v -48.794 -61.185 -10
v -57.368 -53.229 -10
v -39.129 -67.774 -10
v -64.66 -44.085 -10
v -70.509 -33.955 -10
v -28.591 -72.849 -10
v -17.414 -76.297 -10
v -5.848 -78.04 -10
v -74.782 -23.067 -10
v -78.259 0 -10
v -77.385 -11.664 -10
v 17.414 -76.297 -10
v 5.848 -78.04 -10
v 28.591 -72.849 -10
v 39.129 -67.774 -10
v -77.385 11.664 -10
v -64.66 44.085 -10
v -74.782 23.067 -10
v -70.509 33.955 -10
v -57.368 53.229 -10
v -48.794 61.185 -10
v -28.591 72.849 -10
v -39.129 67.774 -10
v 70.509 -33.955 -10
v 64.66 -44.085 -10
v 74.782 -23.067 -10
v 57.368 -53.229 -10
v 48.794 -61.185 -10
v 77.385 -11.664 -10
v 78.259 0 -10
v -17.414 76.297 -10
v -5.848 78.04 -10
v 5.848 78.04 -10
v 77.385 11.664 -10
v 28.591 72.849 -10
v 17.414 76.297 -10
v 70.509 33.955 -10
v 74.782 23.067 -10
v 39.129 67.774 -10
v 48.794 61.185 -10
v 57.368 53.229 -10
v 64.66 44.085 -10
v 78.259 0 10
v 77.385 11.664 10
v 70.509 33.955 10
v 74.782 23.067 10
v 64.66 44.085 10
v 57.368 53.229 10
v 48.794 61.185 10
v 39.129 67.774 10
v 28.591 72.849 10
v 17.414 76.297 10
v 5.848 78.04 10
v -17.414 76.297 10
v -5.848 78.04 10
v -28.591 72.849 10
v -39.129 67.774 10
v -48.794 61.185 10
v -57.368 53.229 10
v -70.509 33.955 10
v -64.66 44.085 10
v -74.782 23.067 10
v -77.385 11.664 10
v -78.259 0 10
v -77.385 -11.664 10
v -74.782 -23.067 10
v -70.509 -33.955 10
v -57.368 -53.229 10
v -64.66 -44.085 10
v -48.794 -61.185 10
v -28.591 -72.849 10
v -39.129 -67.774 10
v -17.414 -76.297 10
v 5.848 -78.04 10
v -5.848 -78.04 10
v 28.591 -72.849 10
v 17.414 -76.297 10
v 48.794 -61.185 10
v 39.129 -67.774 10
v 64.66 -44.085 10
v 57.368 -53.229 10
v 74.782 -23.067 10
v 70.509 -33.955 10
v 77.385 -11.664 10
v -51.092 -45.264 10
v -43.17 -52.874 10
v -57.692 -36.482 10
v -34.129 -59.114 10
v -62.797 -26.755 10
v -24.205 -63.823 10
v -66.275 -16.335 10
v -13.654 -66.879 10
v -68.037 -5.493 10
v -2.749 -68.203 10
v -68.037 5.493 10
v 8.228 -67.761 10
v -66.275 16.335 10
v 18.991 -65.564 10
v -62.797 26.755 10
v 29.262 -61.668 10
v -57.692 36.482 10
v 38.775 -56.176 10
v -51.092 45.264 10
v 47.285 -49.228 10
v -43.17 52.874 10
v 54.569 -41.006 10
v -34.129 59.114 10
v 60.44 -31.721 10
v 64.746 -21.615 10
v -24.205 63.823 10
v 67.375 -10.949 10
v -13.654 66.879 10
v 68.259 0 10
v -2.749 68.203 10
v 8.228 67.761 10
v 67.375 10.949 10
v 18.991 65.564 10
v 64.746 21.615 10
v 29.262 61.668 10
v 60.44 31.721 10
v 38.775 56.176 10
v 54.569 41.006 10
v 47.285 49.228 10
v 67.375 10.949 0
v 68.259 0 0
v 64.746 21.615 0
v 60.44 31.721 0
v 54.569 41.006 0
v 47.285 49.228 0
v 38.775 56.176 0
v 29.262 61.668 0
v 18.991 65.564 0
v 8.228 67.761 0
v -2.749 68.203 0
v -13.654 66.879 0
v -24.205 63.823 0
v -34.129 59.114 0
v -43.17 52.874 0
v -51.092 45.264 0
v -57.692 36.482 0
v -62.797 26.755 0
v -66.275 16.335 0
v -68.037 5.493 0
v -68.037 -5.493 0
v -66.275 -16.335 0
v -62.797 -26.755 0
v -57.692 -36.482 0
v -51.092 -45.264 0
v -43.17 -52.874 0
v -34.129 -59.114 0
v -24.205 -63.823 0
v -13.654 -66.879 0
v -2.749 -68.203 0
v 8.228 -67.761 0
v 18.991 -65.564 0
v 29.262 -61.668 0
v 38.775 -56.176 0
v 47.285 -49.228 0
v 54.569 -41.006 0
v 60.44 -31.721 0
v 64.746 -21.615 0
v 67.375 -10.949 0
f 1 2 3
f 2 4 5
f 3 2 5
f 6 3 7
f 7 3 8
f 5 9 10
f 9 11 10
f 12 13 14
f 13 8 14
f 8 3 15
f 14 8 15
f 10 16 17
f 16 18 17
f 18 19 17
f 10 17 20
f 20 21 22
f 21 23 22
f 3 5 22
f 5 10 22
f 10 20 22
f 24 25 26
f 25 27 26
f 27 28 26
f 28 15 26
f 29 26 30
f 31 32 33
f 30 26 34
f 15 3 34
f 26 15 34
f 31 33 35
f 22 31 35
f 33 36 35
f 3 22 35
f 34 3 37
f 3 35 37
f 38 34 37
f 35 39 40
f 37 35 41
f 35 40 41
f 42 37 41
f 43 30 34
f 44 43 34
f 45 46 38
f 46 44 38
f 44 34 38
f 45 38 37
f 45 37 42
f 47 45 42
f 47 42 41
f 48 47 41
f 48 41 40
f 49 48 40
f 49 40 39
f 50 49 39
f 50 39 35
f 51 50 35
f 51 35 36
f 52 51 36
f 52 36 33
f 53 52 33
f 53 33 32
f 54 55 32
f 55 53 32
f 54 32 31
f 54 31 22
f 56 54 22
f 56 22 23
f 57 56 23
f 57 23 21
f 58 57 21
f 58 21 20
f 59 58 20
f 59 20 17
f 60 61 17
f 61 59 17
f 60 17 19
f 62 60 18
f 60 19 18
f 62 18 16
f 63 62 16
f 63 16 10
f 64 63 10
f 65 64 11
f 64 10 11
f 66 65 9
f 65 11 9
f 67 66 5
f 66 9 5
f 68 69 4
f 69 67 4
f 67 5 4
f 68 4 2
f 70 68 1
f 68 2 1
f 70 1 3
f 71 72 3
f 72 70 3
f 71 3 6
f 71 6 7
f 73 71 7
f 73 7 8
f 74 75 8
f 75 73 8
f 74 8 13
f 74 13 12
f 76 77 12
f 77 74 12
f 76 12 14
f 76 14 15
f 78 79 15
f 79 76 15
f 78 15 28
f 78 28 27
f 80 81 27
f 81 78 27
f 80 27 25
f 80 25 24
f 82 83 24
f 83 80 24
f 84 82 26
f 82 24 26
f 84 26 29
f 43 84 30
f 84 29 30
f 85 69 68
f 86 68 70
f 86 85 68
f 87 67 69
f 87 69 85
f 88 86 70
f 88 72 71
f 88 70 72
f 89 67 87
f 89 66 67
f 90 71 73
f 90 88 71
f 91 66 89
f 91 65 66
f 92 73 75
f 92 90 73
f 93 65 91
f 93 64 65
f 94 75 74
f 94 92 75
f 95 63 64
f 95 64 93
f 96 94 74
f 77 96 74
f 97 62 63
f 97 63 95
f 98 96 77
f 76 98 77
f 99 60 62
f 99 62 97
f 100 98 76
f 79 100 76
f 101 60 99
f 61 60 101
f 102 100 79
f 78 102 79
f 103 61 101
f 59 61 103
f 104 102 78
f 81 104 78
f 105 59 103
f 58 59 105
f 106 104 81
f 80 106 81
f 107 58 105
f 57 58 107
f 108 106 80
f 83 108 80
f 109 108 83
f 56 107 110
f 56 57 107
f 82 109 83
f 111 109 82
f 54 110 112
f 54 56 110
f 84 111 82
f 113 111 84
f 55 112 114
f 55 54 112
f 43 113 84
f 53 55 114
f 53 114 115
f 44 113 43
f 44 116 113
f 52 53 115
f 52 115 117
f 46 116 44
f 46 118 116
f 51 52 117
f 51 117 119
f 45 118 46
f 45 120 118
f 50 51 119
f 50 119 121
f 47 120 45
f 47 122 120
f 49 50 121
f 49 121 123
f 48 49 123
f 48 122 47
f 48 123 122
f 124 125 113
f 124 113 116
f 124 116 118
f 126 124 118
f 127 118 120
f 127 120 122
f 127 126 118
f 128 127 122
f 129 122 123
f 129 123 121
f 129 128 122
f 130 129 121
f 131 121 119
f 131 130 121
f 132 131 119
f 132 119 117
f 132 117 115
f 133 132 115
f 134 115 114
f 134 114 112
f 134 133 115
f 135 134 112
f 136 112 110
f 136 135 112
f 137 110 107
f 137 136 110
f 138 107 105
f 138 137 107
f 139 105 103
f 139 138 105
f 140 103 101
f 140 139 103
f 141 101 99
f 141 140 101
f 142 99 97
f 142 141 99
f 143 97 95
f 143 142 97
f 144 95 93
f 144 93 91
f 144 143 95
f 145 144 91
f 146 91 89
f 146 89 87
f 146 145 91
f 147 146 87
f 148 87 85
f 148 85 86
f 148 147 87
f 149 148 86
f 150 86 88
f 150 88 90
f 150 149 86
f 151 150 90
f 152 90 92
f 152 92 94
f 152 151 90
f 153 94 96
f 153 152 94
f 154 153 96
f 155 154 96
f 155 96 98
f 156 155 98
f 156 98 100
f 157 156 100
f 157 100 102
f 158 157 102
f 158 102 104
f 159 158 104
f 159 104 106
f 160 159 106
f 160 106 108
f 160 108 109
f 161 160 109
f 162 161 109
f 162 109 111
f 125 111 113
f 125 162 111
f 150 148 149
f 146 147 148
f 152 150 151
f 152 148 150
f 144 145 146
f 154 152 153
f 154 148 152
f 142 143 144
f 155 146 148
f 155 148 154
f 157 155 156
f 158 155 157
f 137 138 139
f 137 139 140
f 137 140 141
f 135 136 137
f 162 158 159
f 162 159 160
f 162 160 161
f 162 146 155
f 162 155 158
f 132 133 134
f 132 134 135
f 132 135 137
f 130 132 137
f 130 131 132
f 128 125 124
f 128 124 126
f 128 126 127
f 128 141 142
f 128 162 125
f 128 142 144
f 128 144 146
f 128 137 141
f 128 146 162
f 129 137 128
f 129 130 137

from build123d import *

# Parameters (mm, degrees)
F0_R     = 68.2587577657
F1_DEPTH = 10
F2_R     = 60.1472105794
F3_DEPTH = 5
F4_R     = 56.5410055919
F5_DEPTH = 7
F6_T     = 10


with BuildPart() as f1:
    # F0 (on Top) → F1 (new body)
    with BuildSketch(Plane.XY):
        Circle(F0_R)
    extrude(amount=F1_DEPTH)

    # F2 (on face) → F3 (join)
    with BuildSketch(Plane.XY.offset(10)):
        Circle(F2_R)
    extrude(amount=-F3_DEPTH)

    # F4 (on face) → F5 (join)
    with BuildSketch(Plane.XY.offset(10)):
        Circle(F4_R)
    extrude(amount=-F5_DEPTH)

    # F6
    f6_openings = [f1.faces().sort_by_distance(p)[0] for p in [
        (0, 0, 10),
    ]]
    offset(amount=F6_T, openings=f6_openings, kind=Kind.INTERSECTION)


solid = f1.part
